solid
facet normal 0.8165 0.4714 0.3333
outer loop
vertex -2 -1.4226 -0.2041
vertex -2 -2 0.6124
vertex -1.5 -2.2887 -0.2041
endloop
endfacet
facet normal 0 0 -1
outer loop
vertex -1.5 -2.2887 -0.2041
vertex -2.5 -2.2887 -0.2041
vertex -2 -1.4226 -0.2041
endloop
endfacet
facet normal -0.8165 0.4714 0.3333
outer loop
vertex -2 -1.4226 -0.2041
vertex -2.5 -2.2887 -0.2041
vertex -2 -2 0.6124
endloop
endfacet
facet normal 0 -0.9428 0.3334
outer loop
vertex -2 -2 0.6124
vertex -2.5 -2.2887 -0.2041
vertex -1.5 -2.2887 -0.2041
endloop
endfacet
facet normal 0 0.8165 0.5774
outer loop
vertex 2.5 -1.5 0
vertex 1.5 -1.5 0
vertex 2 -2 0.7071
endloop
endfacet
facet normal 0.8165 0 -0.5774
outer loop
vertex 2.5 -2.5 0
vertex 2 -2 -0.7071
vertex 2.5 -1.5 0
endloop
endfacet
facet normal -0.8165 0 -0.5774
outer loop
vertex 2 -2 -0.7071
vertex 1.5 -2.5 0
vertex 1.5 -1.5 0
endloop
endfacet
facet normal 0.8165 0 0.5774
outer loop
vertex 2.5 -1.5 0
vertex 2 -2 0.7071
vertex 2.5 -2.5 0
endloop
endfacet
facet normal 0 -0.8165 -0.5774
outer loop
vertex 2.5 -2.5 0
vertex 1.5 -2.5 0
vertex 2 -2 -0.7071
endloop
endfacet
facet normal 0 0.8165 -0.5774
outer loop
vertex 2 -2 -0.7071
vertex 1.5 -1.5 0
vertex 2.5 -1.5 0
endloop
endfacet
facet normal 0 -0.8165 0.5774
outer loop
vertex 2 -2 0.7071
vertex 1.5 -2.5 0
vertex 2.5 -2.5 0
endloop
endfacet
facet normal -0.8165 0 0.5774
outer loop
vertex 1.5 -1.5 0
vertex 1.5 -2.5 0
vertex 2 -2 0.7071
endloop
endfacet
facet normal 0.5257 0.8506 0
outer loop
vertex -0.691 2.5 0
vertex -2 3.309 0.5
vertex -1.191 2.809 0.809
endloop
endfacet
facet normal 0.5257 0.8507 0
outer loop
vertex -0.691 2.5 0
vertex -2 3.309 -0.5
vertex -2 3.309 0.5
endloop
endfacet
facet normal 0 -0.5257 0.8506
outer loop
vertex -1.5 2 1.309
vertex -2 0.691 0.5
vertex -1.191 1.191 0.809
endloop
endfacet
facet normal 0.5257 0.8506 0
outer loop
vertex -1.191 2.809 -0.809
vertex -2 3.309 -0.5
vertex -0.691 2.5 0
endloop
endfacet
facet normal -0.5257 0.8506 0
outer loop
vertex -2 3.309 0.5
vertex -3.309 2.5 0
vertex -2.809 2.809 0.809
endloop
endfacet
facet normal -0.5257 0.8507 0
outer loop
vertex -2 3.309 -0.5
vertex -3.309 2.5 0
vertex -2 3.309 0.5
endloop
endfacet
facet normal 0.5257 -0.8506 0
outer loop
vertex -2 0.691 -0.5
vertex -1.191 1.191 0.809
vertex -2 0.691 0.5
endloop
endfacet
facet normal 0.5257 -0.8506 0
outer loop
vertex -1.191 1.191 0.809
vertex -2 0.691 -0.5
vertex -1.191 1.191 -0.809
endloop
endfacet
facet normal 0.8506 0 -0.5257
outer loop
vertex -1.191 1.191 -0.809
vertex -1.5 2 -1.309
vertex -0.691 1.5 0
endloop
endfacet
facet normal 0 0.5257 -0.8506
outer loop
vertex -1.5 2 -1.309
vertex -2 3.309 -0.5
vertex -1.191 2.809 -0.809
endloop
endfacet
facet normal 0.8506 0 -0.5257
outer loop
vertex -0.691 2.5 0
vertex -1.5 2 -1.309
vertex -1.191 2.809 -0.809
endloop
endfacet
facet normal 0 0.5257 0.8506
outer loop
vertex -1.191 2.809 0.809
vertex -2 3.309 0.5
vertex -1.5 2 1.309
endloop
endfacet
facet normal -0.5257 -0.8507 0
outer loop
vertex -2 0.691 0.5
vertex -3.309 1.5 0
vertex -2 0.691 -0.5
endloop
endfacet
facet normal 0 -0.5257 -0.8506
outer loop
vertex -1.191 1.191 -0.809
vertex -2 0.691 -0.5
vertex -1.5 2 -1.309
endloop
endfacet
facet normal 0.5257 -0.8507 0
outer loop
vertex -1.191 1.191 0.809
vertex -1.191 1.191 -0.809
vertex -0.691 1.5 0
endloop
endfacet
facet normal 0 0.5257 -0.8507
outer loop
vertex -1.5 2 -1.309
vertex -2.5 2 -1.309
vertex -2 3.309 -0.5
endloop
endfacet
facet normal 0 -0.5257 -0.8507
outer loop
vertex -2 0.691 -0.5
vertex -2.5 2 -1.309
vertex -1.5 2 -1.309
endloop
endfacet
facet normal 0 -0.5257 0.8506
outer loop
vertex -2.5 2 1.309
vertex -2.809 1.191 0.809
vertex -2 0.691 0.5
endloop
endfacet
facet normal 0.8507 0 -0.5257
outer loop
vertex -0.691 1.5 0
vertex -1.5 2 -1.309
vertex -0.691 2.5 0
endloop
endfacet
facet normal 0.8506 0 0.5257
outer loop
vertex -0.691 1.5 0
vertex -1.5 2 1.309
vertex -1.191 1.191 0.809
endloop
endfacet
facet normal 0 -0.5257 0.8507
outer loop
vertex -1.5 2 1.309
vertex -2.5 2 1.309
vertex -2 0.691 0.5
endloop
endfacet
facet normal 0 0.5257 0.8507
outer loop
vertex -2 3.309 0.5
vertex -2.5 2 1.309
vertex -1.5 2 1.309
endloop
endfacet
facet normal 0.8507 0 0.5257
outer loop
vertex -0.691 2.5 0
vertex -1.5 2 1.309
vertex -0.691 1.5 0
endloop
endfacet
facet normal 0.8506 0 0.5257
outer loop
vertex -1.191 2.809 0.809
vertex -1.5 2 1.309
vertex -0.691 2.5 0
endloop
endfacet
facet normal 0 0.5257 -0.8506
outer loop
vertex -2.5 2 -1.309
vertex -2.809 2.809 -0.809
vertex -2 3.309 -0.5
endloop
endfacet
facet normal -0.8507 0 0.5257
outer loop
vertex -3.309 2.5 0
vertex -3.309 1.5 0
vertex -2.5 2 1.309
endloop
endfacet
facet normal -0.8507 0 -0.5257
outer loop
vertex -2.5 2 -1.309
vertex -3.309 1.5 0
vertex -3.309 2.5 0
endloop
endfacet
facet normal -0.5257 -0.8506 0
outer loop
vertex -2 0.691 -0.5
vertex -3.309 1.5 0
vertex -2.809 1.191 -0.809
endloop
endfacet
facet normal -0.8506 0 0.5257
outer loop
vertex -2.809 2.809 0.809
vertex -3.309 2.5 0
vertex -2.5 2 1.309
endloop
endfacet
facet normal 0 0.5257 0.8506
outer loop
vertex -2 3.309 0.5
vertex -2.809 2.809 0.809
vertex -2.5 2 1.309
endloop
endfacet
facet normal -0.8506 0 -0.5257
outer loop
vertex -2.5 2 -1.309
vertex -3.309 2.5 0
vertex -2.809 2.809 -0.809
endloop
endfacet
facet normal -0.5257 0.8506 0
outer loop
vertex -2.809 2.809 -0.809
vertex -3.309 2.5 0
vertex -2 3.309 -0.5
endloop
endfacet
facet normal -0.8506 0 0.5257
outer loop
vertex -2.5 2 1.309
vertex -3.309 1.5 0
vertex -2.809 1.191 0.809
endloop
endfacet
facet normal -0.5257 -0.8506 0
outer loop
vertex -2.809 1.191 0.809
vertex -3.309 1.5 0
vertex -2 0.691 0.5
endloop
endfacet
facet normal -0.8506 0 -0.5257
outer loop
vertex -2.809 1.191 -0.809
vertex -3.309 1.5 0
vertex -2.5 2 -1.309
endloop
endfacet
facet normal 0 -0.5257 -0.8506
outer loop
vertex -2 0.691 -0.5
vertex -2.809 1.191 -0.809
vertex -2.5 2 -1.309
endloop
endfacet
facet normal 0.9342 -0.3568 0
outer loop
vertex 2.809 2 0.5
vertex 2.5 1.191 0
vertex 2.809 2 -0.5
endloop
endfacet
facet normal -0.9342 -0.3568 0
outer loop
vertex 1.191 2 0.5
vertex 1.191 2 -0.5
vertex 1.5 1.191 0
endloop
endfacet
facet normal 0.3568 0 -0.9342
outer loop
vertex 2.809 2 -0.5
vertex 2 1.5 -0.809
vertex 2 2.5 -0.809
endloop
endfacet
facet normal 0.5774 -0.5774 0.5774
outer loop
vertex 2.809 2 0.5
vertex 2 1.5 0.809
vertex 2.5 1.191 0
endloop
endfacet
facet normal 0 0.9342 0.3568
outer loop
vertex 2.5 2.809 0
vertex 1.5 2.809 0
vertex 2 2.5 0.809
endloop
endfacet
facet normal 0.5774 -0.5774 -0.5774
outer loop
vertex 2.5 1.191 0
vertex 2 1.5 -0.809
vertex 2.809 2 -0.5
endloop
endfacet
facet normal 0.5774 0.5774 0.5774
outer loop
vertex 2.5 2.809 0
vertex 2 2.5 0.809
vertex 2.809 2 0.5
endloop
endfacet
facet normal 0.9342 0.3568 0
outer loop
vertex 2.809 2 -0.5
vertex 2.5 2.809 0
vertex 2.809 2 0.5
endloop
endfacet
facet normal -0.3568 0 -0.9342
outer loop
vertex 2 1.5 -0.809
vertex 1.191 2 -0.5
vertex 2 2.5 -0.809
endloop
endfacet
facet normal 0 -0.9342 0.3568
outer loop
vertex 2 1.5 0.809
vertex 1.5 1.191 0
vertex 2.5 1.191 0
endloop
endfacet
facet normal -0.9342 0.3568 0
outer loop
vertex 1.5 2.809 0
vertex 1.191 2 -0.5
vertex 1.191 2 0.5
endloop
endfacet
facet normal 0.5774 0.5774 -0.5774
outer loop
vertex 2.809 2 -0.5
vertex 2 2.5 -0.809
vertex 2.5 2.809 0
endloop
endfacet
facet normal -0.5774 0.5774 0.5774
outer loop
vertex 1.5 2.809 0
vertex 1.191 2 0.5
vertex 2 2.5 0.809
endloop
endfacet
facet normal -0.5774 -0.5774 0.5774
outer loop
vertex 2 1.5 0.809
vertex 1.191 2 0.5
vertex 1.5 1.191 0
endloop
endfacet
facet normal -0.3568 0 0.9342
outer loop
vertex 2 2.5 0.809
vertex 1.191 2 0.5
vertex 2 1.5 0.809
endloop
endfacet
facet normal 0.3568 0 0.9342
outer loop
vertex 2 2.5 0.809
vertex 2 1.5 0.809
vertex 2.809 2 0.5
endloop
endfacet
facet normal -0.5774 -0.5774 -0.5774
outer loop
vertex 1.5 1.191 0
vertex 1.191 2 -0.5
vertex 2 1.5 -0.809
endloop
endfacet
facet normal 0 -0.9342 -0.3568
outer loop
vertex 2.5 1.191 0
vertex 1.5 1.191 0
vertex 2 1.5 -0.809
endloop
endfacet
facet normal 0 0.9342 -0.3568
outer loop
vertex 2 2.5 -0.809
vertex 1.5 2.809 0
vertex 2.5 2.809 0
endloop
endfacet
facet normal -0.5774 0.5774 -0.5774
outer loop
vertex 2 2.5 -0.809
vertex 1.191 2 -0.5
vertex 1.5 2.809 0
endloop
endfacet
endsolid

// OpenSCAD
// The non-built-in Platonic solids.
// See the readme file for the math.

module tetrahedron() {
    // regular tetrahedron (centered at origin, edge length 1)

    he = 1 / 2;        // half the edge length
    fi = sqrt(3) / 6;  // faces - incircle radius
    fc = sqrt(3) / 3;  // faces - circumcircle radius
    i = sqrt(6) / 12;  // insphere radius
    c = sqrt(6) / 4;   // circumsphere radius

    polyhedron(
        // vertices
        [
            [  0,   0,  c],  // 0: top
            [  0,  fc, -i],  // 1: bottom front
            [-he, -fi, -i],  // 2: bottom rear left
            [ he, -fi, -i],  // 3: bottom rear right
        ],
        // faces
        [
            [0, 1, 3],  // right
            [0, 2, 1],  // left
            [0, 3, 2],  // rear
            [1, 2, 3],  // bottom
        ]
    );
}

module octahedron() {
    // regular octahedron (centered at origin, edge length 1)

    he = 1 / 2;       // half the edge length
    c = sqrt(2) / 2;  // circumsphere radius

    polyhedron(
        // vertices
        [
            [  0,   0,  c],  // 0: top
            [-he,  he,  0],  // 1: front left
            [ he,  he,  0],  // 2: front right
            [ he, -he,  0],  // 3: rear right
            [-he, -he,  0],  // 4: rear left
            [  0,   0, -c],  // 5: bottom
        ],
        // faces
        [
            [0, 1, 2],  // top front
            [0, 2, 3],  // top right
            [0, 3, 4],  // top rear
            [0, 4, 1],  // top left
            [1, 5, 2],  // bottom front
            [2, 5, 3],  // bottom right
            [3, 5, 4],  // bottom rear
            [1, 4, 5],  // bottom left
        ]
    );
}

module dodecahedron() {
    // regular dodecahedron (centered at origin, edge length 1)

    // coordinates of the "cube"
    c = (1 + sqrt(5)) / 4;  // phi / 2
    // coordinates of the "rectangular cuboid"
    r1 = 0;
    r2 = (3 + sqrt(5)) / 4;  // (phi + 1) / 2
    r3 = 1 / 2;

    polyhedron(
        // vertices
        [
            [ r1,  r2,  r3],  //  0: front top
            [ r1,  r2, -r3],  //  1: front bottom
            [ r1, -r2,  r3],  //  2: rear top
            [ r1, -r2, -r3],  //  3: rear bottom
            [ r3,  r1,  r2],  //  4: top right
            [ r3,  r1, -r2],  //  5: bottom right
            [-r3,  r1,  r2],  //  6: top left
            [-r3,  r1, -r2],  //  7: bottom left
            [  c,   c,   c],  //  8: top front right
            [  c,   c,  -c],  //  9: bottom front right
            [  c,  -c,   c],  // 10: top rear right
            [  c,  -c,  -c],  // 11: bottom rear right
            [ -c,   c,   c],  // 12: top front left
            [ -c,   c,  -c],  // 13: bottom front left
            [ -c,  -c,   c],  // 14: top rear left
            [ -c,  -c,  -c],  // 15: bottom rear left
            [ r2,  r3,  r1],  // 16: right front
            [ r2, -r3,  r1],  // 17: right rear
            [-r2,  r3,  r1],  // 18: left front
            [-r2, -r3,  r1],  // 19: left rear
        ],
        // faces
        [
            [ 0,  1,  9, 16,  8],  // front right
            [ 0,  8,  4,  6, 12],  // top front
            [ 0, 12, 18, 13,  1],  // front left
            [ 1, 13,  7,  5,  9],  // bottom front
            [ 2,  3, 15, 19, 14],  // rear left
            [ 2, 10, 17, 11,  3],  // rear right
            [ 2, 14,  6,  4, 10],  // top rear
            [ 3, 11,  5,  7, 15],  // bottom rear
            [ 4,  8, 16, 17, 10],  // right top
            [ 5, 11, 17, 16,  9],  // right bottom
            [ 6, 14, 19, 18, 12],  // left top
            [ 7, 13, 18, 19, 15],  // left bottom
        ]
    );
}

module icosahedron() {
    // regular icosahedron (centered at origin, edge length 1)

    c1 = 0;                  // coordinate 1
    c2 = 1 / 2;              // coordinate 2
    c3 = (1 + sqrt(5)) / 4;  // coordinate 3; phi / 2

    polyhedron(
        // vertices
        [
            [ c3,  c1,  c2],  //  0: right top
            [ c3,  c1, -c2],  //  1: right bottom
            [-c3,  c1,  c2],  //  2: left top
            [-c3,  c1, -c2],  //  3: left bottom
            [ c2,  c3,  c1],  //  4: front right
            [ c2, -c3,  c1],  //  5: rear right
            [-c2,  c3,  c1],  //  6: front left
            [-c2, -c3,  c1],  //  7: rear left
            [ c1,  c2,  c3],  //  8: top front
            [ c1,  c2, -c3],  //  9: bottom front
            [ c1, -c2,  c3],  // 10: top rear
            [ c1, -c2, -c3],  // 11: bottom rear
        ],
        // faces
        [
            [ 0,  1,  5],  // right rear
            [ 0,  4,  1],  // right front
            [ 0,  5, 10],  // top rear right
            [ 0,  8,  4],  // top front right
            [ 0, 10,  8],  // top right
            [ 1,  4,  9],  // bottom front right
            [ 1,  9, 11],  // bottom right
            [ 1, 11,  5],  // bottom rear right
            [ 2,  3,  6],  // left front
            [ 2,  6,  8],  // top front left
            [ 2,  7,  3],  // left rear
            [ 2,  8, 10],  // top left
            [ 2, 10,  7],  // top rear left
            [ 3,  7, 11],  // bottom rear left
            [ 3,  9,  6],  // bottom front left
            [ 3, 11,  9],  // bottom left
            [ 4,  6,  9],  // front bottom
            [ 4,  8,  6],  // front top
            [ 5,  7, 10],  // rear top
            [ 5, 11,  7],  // rear bottom
        ]
    );
}

// demo
translate([-2, -2]) tetrahedron();
translate([ 2, -2]) octahedron();
translate([-2,  2]) dodecahedron();
translate([ 2,  2]) icosahedron();
